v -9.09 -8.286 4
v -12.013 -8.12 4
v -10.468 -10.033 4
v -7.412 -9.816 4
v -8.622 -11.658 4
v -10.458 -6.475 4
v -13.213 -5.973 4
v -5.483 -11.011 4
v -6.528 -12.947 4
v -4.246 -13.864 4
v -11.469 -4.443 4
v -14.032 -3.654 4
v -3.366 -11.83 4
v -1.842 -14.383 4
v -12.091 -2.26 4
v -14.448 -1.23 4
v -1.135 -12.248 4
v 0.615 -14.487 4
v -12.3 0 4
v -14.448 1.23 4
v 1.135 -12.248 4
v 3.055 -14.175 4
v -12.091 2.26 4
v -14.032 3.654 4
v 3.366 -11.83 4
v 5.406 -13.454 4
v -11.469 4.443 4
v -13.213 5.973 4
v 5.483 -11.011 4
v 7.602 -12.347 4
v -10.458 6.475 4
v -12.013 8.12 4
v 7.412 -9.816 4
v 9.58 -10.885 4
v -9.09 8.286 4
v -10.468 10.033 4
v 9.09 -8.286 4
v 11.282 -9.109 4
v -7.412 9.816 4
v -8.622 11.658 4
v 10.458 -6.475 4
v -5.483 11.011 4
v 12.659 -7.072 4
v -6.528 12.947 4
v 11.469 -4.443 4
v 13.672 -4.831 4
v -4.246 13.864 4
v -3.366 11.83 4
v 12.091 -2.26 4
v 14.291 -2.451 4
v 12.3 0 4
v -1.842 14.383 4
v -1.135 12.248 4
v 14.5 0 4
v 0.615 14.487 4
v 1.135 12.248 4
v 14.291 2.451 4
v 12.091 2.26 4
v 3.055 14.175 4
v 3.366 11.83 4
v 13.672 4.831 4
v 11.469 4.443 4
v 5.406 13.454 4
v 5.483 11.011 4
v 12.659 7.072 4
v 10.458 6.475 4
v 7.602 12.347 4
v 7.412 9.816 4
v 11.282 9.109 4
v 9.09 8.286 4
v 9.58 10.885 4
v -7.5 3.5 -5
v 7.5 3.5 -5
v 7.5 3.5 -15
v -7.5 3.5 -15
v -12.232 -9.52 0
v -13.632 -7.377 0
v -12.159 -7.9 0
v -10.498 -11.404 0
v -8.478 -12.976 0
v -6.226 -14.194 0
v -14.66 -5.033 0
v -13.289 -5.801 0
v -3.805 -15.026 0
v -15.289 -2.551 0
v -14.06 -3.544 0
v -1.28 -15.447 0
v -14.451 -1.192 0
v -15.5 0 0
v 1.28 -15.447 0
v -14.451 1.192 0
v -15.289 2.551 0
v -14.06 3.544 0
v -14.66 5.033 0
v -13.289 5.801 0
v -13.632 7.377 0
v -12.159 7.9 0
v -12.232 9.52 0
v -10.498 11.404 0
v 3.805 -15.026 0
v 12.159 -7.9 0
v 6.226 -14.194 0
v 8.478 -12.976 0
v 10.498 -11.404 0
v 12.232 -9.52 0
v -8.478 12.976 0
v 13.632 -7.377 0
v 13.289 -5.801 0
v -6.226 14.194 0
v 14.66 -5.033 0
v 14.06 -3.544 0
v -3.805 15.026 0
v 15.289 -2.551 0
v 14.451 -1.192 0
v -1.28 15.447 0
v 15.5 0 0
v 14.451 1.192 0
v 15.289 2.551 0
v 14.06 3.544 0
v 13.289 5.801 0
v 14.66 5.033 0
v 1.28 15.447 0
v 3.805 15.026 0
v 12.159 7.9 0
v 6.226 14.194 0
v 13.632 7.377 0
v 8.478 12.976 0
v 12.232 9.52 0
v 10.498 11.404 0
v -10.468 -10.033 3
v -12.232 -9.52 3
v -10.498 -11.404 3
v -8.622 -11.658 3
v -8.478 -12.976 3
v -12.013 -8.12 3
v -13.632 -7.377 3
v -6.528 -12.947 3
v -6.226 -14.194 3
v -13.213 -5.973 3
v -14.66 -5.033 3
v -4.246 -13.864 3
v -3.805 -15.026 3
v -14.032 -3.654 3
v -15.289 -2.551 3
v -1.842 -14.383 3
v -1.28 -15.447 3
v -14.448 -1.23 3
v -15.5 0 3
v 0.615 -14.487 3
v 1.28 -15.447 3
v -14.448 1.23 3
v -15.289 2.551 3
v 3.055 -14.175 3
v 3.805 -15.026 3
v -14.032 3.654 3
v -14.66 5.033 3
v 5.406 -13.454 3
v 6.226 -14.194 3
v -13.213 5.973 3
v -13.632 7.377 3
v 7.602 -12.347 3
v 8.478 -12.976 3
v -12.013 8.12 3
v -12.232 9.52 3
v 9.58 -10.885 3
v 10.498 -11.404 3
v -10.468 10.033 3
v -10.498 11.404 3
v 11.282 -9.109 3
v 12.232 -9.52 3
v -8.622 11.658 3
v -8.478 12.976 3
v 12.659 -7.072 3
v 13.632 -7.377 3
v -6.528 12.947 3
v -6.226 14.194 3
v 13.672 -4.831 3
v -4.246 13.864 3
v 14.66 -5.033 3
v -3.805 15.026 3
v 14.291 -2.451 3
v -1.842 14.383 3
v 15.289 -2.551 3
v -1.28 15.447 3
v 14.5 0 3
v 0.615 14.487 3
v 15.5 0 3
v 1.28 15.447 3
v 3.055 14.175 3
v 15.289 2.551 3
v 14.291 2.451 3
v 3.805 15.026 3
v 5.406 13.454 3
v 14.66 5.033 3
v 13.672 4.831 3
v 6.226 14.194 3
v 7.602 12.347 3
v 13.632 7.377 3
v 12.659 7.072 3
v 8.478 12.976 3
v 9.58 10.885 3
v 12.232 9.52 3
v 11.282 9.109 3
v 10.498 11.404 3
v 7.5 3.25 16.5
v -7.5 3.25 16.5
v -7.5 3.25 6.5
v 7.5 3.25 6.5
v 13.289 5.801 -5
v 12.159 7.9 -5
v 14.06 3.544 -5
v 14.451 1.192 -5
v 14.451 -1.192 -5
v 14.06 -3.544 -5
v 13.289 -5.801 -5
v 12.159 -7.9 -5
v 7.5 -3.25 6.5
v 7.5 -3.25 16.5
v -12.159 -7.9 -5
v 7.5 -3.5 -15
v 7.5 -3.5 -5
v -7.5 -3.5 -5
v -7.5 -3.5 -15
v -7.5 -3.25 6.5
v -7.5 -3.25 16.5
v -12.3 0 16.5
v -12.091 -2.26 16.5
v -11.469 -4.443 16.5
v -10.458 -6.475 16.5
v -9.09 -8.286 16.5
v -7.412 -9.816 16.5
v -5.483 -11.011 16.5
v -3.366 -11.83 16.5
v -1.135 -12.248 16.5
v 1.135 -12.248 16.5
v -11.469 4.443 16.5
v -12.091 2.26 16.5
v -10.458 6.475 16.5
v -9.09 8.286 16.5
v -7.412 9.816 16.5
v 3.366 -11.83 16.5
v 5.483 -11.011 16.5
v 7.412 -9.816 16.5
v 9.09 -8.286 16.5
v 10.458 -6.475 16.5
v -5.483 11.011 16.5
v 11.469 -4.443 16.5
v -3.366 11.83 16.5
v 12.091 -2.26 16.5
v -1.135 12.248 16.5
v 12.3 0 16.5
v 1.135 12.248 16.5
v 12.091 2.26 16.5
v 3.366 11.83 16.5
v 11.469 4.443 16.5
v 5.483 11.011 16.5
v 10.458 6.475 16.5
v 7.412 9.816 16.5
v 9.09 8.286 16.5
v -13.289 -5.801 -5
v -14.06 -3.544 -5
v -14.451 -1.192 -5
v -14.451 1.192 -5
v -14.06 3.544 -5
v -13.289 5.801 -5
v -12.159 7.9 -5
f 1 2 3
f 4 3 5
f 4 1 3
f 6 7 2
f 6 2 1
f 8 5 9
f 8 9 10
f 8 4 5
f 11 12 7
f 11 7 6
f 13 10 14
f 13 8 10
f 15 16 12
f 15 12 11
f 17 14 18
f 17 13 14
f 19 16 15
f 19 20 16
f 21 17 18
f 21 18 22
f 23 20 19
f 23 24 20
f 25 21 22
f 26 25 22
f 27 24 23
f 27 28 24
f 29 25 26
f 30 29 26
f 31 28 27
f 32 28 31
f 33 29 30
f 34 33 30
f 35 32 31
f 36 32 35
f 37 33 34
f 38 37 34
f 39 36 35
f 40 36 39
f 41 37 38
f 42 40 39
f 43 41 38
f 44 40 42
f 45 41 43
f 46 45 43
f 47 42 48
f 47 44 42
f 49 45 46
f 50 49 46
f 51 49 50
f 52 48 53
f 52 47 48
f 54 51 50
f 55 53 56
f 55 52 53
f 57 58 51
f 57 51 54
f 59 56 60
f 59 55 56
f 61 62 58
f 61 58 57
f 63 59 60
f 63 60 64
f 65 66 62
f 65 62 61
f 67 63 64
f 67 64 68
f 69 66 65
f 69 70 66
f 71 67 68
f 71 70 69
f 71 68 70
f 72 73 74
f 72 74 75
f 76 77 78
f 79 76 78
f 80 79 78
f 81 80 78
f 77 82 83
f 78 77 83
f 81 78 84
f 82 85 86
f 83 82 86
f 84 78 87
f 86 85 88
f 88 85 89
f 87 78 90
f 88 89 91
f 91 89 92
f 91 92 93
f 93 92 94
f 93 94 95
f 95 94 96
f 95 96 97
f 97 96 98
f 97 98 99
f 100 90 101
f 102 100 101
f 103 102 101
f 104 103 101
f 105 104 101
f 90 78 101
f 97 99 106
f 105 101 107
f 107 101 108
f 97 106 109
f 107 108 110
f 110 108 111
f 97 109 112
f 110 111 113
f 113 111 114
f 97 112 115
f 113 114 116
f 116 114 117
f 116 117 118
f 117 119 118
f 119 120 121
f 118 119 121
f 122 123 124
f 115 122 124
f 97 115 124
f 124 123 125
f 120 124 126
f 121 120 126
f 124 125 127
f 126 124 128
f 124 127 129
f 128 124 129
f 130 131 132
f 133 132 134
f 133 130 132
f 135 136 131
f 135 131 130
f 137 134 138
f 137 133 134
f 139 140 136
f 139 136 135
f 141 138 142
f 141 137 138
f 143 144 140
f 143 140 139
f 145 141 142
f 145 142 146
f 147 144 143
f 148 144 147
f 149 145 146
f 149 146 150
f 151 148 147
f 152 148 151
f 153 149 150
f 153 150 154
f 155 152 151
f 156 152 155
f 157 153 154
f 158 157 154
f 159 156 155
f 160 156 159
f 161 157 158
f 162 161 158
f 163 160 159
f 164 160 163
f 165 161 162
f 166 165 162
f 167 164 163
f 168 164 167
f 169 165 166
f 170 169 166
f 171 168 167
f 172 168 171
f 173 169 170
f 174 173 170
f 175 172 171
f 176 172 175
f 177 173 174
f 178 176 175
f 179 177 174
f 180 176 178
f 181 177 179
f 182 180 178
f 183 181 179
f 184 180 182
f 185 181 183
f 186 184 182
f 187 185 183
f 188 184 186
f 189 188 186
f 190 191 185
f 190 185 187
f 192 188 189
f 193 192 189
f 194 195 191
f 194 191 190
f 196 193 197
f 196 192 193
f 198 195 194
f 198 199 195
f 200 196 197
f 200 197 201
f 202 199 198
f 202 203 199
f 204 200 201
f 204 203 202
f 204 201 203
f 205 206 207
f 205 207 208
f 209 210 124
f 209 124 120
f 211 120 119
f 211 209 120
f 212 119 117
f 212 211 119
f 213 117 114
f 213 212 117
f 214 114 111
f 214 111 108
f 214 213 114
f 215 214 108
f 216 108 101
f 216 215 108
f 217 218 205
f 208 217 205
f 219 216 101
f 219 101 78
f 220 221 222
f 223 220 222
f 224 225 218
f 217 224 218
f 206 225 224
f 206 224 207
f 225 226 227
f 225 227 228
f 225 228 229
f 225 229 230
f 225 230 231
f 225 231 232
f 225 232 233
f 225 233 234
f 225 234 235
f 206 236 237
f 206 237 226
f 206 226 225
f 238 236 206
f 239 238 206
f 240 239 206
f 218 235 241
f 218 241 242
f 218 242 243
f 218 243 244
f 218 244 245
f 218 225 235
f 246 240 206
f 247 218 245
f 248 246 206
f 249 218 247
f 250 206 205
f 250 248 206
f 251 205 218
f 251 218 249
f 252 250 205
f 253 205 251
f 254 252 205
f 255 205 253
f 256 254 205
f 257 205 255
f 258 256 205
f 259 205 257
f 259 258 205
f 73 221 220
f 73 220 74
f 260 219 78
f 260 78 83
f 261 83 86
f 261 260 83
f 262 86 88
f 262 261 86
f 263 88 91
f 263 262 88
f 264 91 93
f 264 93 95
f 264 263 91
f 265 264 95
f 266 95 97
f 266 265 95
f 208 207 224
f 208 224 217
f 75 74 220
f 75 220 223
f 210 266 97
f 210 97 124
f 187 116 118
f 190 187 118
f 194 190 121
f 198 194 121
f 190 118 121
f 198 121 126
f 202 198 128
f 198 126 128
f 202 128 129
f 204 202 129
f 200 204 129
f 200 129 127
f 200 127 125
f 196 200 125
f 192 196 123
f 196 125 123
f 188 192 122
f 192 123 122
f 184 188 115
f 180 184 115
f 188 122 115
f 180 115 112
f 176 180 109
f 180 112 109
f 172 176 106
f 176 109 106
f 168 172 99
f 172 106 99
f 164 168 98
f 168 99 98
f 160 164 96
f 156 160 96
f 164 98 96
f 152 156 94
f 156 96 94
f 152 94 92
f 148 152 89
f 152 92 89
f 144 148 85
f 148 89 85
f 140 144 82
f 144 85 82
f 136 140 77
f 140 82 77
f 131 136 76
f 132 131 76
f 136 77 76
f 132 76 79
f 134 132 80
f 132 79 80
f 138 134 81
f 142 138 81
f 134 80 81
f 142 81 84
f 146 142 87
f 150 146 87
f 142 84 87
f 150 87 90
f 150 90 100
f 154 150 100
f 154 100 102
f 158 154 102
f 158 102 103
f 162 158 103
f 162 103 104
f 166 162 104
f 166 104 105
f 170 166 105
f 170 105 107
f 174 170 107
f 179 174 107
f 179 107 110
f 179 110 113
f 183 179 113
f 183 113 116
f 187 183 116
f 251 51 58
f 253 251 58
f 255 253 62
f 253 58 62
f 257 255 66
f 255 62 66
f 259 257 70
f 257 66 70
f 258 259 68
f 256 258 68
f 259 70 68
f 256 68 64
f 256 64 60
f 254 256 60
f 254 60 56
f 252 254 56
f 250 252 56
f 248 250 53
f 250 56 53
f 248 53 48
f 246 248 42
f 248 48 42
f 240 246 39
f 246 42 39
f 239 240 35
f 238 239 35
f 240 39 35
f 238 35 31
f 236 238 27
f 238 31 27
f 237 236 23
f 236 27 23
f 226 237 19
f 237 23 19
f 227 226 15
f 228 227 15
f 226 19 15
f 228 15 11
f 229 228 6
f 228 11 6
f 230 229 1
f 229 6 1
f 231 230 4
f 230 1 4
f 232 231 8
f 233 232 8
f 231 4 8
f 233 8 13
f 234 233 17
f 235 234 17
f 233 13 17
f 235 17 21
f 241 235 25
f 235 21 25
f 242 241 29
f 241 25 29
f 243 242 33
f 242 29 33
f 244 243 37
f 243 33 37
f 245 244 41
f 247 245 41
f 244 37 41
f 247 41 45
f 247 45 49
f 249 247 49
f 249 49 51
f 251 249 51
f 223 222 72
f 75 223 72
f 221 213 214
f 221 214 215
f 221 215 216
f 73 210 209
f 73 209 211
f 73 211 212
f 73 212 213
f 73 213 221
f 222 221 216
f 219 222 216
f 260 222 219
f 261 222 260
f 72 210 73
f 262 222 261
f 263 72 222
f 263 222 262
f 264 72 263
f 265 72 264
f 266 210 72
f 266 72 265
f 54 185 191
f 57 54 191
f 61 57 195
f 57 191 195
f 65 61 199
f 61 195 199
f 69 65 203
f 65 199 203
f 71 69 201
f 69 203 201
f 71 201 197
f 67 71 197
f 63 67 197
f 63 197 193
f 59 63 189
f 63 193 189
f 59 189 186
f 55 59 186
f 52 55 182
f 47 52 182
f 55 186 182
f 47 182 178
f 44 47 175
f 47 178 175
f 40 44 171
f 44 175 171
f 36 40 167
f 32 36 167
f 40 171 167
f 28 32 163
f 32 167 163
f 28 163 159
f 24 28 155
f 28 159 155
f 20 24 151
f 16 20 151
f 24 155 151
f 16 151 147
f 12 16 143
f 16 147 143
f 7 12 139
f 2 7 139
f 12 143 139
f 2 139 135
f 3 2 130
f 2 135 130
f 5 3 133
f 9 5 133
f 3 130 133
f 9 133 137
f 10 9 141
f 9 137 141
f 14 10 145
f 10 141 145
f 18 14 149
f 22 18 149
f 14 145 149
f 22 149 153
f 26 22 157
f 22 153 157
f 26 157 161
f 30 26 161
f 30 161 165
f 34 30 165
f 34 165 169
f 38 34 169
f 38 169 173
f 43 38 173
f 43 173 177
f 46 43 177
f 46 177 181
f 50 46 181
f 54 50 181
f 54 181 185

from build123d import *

# Parameters (mm, degrees)
SKETCH_1_R          = 15.5
EXTRUDE_1_DEPTH     = 3
SKETCH_2_R          = 14.5
EXTRUDE_2_DEPTH     = 1
SKETCH_3_R          = 12.3
EXTRUDE_3_DEPTH     = 12.5
SKETCH_4_W          = 15
SKETCH_4_H          = 6.5
CUT_EXTRUDE_1_DEPTH = 10
EXTRUDE_START       = 5
EXTRUDE_4_DEPTH     = 5
SKETCH_6_W          = 15
SKETCH_6_H          = 7
EXTRUDE_5_DEPTH     = 10


with BuildPart() as part:
    # ｽｹｯﾁ1 → ﾎﾞｽ - 押し出し1 (new body)
    with BuildSketch(Plane.XY):
        Circle(SKETCH_1_R)
    extrude(amount=EXTRUDE_1_DEPTH)

    # ｽｹｯﾁ2 → ﾎﾞｽ - 押し出し2 (add)
    with BuildSketch(Plane.XY.offset(3)):
        Circle(SKETCH_2_R)
    extrude(amount=EXTRUDE_2_DEPTH)

    # ｽｹｯﾁ3 → ﾎﾞｽ - 押し出し3 (add)
    with BuildSketch(Plane.XY.offset(4)):
        Circle(SKETCH_3_R)
    extrude(amount=EXTRUDE_3_DEPTH)

    # ｽｹｯﾁ4 → ｶｯﾄ - 押し出し1 (cut)
    with BuildSketch(Plane.XY.offset(16.5)):
        Rectangle(SKETCH_4_W, SKETCH_4_H)
    extrude(amount=-CUT_EXTRUDE_1_DEPTH, mode=Mode.SUBTRACT)

    # ｽｹｯﾁ5 → ﾎﾞｽ - 押し出し4 (add)
    with BuildSketch(Plane(origin=(0, 0, 0), x_dir=(-1, 0, 0), z_dir=(0, 0, -1)).offset(EXTRUDE_START)):
        with BuildLine():
            Line((-12.158947323, -7.9), (12.158947323, -7.9))
            ThreePointArc((12.158947323, -7.9), (14.5, 0), (12.158947323, 7.9))
            Line((12.158947323, 7.9), (-12.158947323, 7.9))
            ThreePointArc((-12.158947323, 7.9), (-14.5, 0), (-12.158947323, -7.9))
        make_face()
    extrude(amount=-EXTRUDE_4_DEPTH)

    # ｽｹｯﾁ6 → ﾎﾞｽ - 押し出し5 (add)
    with BuildSketch(Plane(origin=(0, 0, -5), x_dir=(-1, 0, 0), z_dir=(0, 0, -1))):
        Rectangle(SKETCH_6_W, SKETCH_6_H)
    extrude(amount=EXTRUDE_5_DEPTH)


solid = part.part
